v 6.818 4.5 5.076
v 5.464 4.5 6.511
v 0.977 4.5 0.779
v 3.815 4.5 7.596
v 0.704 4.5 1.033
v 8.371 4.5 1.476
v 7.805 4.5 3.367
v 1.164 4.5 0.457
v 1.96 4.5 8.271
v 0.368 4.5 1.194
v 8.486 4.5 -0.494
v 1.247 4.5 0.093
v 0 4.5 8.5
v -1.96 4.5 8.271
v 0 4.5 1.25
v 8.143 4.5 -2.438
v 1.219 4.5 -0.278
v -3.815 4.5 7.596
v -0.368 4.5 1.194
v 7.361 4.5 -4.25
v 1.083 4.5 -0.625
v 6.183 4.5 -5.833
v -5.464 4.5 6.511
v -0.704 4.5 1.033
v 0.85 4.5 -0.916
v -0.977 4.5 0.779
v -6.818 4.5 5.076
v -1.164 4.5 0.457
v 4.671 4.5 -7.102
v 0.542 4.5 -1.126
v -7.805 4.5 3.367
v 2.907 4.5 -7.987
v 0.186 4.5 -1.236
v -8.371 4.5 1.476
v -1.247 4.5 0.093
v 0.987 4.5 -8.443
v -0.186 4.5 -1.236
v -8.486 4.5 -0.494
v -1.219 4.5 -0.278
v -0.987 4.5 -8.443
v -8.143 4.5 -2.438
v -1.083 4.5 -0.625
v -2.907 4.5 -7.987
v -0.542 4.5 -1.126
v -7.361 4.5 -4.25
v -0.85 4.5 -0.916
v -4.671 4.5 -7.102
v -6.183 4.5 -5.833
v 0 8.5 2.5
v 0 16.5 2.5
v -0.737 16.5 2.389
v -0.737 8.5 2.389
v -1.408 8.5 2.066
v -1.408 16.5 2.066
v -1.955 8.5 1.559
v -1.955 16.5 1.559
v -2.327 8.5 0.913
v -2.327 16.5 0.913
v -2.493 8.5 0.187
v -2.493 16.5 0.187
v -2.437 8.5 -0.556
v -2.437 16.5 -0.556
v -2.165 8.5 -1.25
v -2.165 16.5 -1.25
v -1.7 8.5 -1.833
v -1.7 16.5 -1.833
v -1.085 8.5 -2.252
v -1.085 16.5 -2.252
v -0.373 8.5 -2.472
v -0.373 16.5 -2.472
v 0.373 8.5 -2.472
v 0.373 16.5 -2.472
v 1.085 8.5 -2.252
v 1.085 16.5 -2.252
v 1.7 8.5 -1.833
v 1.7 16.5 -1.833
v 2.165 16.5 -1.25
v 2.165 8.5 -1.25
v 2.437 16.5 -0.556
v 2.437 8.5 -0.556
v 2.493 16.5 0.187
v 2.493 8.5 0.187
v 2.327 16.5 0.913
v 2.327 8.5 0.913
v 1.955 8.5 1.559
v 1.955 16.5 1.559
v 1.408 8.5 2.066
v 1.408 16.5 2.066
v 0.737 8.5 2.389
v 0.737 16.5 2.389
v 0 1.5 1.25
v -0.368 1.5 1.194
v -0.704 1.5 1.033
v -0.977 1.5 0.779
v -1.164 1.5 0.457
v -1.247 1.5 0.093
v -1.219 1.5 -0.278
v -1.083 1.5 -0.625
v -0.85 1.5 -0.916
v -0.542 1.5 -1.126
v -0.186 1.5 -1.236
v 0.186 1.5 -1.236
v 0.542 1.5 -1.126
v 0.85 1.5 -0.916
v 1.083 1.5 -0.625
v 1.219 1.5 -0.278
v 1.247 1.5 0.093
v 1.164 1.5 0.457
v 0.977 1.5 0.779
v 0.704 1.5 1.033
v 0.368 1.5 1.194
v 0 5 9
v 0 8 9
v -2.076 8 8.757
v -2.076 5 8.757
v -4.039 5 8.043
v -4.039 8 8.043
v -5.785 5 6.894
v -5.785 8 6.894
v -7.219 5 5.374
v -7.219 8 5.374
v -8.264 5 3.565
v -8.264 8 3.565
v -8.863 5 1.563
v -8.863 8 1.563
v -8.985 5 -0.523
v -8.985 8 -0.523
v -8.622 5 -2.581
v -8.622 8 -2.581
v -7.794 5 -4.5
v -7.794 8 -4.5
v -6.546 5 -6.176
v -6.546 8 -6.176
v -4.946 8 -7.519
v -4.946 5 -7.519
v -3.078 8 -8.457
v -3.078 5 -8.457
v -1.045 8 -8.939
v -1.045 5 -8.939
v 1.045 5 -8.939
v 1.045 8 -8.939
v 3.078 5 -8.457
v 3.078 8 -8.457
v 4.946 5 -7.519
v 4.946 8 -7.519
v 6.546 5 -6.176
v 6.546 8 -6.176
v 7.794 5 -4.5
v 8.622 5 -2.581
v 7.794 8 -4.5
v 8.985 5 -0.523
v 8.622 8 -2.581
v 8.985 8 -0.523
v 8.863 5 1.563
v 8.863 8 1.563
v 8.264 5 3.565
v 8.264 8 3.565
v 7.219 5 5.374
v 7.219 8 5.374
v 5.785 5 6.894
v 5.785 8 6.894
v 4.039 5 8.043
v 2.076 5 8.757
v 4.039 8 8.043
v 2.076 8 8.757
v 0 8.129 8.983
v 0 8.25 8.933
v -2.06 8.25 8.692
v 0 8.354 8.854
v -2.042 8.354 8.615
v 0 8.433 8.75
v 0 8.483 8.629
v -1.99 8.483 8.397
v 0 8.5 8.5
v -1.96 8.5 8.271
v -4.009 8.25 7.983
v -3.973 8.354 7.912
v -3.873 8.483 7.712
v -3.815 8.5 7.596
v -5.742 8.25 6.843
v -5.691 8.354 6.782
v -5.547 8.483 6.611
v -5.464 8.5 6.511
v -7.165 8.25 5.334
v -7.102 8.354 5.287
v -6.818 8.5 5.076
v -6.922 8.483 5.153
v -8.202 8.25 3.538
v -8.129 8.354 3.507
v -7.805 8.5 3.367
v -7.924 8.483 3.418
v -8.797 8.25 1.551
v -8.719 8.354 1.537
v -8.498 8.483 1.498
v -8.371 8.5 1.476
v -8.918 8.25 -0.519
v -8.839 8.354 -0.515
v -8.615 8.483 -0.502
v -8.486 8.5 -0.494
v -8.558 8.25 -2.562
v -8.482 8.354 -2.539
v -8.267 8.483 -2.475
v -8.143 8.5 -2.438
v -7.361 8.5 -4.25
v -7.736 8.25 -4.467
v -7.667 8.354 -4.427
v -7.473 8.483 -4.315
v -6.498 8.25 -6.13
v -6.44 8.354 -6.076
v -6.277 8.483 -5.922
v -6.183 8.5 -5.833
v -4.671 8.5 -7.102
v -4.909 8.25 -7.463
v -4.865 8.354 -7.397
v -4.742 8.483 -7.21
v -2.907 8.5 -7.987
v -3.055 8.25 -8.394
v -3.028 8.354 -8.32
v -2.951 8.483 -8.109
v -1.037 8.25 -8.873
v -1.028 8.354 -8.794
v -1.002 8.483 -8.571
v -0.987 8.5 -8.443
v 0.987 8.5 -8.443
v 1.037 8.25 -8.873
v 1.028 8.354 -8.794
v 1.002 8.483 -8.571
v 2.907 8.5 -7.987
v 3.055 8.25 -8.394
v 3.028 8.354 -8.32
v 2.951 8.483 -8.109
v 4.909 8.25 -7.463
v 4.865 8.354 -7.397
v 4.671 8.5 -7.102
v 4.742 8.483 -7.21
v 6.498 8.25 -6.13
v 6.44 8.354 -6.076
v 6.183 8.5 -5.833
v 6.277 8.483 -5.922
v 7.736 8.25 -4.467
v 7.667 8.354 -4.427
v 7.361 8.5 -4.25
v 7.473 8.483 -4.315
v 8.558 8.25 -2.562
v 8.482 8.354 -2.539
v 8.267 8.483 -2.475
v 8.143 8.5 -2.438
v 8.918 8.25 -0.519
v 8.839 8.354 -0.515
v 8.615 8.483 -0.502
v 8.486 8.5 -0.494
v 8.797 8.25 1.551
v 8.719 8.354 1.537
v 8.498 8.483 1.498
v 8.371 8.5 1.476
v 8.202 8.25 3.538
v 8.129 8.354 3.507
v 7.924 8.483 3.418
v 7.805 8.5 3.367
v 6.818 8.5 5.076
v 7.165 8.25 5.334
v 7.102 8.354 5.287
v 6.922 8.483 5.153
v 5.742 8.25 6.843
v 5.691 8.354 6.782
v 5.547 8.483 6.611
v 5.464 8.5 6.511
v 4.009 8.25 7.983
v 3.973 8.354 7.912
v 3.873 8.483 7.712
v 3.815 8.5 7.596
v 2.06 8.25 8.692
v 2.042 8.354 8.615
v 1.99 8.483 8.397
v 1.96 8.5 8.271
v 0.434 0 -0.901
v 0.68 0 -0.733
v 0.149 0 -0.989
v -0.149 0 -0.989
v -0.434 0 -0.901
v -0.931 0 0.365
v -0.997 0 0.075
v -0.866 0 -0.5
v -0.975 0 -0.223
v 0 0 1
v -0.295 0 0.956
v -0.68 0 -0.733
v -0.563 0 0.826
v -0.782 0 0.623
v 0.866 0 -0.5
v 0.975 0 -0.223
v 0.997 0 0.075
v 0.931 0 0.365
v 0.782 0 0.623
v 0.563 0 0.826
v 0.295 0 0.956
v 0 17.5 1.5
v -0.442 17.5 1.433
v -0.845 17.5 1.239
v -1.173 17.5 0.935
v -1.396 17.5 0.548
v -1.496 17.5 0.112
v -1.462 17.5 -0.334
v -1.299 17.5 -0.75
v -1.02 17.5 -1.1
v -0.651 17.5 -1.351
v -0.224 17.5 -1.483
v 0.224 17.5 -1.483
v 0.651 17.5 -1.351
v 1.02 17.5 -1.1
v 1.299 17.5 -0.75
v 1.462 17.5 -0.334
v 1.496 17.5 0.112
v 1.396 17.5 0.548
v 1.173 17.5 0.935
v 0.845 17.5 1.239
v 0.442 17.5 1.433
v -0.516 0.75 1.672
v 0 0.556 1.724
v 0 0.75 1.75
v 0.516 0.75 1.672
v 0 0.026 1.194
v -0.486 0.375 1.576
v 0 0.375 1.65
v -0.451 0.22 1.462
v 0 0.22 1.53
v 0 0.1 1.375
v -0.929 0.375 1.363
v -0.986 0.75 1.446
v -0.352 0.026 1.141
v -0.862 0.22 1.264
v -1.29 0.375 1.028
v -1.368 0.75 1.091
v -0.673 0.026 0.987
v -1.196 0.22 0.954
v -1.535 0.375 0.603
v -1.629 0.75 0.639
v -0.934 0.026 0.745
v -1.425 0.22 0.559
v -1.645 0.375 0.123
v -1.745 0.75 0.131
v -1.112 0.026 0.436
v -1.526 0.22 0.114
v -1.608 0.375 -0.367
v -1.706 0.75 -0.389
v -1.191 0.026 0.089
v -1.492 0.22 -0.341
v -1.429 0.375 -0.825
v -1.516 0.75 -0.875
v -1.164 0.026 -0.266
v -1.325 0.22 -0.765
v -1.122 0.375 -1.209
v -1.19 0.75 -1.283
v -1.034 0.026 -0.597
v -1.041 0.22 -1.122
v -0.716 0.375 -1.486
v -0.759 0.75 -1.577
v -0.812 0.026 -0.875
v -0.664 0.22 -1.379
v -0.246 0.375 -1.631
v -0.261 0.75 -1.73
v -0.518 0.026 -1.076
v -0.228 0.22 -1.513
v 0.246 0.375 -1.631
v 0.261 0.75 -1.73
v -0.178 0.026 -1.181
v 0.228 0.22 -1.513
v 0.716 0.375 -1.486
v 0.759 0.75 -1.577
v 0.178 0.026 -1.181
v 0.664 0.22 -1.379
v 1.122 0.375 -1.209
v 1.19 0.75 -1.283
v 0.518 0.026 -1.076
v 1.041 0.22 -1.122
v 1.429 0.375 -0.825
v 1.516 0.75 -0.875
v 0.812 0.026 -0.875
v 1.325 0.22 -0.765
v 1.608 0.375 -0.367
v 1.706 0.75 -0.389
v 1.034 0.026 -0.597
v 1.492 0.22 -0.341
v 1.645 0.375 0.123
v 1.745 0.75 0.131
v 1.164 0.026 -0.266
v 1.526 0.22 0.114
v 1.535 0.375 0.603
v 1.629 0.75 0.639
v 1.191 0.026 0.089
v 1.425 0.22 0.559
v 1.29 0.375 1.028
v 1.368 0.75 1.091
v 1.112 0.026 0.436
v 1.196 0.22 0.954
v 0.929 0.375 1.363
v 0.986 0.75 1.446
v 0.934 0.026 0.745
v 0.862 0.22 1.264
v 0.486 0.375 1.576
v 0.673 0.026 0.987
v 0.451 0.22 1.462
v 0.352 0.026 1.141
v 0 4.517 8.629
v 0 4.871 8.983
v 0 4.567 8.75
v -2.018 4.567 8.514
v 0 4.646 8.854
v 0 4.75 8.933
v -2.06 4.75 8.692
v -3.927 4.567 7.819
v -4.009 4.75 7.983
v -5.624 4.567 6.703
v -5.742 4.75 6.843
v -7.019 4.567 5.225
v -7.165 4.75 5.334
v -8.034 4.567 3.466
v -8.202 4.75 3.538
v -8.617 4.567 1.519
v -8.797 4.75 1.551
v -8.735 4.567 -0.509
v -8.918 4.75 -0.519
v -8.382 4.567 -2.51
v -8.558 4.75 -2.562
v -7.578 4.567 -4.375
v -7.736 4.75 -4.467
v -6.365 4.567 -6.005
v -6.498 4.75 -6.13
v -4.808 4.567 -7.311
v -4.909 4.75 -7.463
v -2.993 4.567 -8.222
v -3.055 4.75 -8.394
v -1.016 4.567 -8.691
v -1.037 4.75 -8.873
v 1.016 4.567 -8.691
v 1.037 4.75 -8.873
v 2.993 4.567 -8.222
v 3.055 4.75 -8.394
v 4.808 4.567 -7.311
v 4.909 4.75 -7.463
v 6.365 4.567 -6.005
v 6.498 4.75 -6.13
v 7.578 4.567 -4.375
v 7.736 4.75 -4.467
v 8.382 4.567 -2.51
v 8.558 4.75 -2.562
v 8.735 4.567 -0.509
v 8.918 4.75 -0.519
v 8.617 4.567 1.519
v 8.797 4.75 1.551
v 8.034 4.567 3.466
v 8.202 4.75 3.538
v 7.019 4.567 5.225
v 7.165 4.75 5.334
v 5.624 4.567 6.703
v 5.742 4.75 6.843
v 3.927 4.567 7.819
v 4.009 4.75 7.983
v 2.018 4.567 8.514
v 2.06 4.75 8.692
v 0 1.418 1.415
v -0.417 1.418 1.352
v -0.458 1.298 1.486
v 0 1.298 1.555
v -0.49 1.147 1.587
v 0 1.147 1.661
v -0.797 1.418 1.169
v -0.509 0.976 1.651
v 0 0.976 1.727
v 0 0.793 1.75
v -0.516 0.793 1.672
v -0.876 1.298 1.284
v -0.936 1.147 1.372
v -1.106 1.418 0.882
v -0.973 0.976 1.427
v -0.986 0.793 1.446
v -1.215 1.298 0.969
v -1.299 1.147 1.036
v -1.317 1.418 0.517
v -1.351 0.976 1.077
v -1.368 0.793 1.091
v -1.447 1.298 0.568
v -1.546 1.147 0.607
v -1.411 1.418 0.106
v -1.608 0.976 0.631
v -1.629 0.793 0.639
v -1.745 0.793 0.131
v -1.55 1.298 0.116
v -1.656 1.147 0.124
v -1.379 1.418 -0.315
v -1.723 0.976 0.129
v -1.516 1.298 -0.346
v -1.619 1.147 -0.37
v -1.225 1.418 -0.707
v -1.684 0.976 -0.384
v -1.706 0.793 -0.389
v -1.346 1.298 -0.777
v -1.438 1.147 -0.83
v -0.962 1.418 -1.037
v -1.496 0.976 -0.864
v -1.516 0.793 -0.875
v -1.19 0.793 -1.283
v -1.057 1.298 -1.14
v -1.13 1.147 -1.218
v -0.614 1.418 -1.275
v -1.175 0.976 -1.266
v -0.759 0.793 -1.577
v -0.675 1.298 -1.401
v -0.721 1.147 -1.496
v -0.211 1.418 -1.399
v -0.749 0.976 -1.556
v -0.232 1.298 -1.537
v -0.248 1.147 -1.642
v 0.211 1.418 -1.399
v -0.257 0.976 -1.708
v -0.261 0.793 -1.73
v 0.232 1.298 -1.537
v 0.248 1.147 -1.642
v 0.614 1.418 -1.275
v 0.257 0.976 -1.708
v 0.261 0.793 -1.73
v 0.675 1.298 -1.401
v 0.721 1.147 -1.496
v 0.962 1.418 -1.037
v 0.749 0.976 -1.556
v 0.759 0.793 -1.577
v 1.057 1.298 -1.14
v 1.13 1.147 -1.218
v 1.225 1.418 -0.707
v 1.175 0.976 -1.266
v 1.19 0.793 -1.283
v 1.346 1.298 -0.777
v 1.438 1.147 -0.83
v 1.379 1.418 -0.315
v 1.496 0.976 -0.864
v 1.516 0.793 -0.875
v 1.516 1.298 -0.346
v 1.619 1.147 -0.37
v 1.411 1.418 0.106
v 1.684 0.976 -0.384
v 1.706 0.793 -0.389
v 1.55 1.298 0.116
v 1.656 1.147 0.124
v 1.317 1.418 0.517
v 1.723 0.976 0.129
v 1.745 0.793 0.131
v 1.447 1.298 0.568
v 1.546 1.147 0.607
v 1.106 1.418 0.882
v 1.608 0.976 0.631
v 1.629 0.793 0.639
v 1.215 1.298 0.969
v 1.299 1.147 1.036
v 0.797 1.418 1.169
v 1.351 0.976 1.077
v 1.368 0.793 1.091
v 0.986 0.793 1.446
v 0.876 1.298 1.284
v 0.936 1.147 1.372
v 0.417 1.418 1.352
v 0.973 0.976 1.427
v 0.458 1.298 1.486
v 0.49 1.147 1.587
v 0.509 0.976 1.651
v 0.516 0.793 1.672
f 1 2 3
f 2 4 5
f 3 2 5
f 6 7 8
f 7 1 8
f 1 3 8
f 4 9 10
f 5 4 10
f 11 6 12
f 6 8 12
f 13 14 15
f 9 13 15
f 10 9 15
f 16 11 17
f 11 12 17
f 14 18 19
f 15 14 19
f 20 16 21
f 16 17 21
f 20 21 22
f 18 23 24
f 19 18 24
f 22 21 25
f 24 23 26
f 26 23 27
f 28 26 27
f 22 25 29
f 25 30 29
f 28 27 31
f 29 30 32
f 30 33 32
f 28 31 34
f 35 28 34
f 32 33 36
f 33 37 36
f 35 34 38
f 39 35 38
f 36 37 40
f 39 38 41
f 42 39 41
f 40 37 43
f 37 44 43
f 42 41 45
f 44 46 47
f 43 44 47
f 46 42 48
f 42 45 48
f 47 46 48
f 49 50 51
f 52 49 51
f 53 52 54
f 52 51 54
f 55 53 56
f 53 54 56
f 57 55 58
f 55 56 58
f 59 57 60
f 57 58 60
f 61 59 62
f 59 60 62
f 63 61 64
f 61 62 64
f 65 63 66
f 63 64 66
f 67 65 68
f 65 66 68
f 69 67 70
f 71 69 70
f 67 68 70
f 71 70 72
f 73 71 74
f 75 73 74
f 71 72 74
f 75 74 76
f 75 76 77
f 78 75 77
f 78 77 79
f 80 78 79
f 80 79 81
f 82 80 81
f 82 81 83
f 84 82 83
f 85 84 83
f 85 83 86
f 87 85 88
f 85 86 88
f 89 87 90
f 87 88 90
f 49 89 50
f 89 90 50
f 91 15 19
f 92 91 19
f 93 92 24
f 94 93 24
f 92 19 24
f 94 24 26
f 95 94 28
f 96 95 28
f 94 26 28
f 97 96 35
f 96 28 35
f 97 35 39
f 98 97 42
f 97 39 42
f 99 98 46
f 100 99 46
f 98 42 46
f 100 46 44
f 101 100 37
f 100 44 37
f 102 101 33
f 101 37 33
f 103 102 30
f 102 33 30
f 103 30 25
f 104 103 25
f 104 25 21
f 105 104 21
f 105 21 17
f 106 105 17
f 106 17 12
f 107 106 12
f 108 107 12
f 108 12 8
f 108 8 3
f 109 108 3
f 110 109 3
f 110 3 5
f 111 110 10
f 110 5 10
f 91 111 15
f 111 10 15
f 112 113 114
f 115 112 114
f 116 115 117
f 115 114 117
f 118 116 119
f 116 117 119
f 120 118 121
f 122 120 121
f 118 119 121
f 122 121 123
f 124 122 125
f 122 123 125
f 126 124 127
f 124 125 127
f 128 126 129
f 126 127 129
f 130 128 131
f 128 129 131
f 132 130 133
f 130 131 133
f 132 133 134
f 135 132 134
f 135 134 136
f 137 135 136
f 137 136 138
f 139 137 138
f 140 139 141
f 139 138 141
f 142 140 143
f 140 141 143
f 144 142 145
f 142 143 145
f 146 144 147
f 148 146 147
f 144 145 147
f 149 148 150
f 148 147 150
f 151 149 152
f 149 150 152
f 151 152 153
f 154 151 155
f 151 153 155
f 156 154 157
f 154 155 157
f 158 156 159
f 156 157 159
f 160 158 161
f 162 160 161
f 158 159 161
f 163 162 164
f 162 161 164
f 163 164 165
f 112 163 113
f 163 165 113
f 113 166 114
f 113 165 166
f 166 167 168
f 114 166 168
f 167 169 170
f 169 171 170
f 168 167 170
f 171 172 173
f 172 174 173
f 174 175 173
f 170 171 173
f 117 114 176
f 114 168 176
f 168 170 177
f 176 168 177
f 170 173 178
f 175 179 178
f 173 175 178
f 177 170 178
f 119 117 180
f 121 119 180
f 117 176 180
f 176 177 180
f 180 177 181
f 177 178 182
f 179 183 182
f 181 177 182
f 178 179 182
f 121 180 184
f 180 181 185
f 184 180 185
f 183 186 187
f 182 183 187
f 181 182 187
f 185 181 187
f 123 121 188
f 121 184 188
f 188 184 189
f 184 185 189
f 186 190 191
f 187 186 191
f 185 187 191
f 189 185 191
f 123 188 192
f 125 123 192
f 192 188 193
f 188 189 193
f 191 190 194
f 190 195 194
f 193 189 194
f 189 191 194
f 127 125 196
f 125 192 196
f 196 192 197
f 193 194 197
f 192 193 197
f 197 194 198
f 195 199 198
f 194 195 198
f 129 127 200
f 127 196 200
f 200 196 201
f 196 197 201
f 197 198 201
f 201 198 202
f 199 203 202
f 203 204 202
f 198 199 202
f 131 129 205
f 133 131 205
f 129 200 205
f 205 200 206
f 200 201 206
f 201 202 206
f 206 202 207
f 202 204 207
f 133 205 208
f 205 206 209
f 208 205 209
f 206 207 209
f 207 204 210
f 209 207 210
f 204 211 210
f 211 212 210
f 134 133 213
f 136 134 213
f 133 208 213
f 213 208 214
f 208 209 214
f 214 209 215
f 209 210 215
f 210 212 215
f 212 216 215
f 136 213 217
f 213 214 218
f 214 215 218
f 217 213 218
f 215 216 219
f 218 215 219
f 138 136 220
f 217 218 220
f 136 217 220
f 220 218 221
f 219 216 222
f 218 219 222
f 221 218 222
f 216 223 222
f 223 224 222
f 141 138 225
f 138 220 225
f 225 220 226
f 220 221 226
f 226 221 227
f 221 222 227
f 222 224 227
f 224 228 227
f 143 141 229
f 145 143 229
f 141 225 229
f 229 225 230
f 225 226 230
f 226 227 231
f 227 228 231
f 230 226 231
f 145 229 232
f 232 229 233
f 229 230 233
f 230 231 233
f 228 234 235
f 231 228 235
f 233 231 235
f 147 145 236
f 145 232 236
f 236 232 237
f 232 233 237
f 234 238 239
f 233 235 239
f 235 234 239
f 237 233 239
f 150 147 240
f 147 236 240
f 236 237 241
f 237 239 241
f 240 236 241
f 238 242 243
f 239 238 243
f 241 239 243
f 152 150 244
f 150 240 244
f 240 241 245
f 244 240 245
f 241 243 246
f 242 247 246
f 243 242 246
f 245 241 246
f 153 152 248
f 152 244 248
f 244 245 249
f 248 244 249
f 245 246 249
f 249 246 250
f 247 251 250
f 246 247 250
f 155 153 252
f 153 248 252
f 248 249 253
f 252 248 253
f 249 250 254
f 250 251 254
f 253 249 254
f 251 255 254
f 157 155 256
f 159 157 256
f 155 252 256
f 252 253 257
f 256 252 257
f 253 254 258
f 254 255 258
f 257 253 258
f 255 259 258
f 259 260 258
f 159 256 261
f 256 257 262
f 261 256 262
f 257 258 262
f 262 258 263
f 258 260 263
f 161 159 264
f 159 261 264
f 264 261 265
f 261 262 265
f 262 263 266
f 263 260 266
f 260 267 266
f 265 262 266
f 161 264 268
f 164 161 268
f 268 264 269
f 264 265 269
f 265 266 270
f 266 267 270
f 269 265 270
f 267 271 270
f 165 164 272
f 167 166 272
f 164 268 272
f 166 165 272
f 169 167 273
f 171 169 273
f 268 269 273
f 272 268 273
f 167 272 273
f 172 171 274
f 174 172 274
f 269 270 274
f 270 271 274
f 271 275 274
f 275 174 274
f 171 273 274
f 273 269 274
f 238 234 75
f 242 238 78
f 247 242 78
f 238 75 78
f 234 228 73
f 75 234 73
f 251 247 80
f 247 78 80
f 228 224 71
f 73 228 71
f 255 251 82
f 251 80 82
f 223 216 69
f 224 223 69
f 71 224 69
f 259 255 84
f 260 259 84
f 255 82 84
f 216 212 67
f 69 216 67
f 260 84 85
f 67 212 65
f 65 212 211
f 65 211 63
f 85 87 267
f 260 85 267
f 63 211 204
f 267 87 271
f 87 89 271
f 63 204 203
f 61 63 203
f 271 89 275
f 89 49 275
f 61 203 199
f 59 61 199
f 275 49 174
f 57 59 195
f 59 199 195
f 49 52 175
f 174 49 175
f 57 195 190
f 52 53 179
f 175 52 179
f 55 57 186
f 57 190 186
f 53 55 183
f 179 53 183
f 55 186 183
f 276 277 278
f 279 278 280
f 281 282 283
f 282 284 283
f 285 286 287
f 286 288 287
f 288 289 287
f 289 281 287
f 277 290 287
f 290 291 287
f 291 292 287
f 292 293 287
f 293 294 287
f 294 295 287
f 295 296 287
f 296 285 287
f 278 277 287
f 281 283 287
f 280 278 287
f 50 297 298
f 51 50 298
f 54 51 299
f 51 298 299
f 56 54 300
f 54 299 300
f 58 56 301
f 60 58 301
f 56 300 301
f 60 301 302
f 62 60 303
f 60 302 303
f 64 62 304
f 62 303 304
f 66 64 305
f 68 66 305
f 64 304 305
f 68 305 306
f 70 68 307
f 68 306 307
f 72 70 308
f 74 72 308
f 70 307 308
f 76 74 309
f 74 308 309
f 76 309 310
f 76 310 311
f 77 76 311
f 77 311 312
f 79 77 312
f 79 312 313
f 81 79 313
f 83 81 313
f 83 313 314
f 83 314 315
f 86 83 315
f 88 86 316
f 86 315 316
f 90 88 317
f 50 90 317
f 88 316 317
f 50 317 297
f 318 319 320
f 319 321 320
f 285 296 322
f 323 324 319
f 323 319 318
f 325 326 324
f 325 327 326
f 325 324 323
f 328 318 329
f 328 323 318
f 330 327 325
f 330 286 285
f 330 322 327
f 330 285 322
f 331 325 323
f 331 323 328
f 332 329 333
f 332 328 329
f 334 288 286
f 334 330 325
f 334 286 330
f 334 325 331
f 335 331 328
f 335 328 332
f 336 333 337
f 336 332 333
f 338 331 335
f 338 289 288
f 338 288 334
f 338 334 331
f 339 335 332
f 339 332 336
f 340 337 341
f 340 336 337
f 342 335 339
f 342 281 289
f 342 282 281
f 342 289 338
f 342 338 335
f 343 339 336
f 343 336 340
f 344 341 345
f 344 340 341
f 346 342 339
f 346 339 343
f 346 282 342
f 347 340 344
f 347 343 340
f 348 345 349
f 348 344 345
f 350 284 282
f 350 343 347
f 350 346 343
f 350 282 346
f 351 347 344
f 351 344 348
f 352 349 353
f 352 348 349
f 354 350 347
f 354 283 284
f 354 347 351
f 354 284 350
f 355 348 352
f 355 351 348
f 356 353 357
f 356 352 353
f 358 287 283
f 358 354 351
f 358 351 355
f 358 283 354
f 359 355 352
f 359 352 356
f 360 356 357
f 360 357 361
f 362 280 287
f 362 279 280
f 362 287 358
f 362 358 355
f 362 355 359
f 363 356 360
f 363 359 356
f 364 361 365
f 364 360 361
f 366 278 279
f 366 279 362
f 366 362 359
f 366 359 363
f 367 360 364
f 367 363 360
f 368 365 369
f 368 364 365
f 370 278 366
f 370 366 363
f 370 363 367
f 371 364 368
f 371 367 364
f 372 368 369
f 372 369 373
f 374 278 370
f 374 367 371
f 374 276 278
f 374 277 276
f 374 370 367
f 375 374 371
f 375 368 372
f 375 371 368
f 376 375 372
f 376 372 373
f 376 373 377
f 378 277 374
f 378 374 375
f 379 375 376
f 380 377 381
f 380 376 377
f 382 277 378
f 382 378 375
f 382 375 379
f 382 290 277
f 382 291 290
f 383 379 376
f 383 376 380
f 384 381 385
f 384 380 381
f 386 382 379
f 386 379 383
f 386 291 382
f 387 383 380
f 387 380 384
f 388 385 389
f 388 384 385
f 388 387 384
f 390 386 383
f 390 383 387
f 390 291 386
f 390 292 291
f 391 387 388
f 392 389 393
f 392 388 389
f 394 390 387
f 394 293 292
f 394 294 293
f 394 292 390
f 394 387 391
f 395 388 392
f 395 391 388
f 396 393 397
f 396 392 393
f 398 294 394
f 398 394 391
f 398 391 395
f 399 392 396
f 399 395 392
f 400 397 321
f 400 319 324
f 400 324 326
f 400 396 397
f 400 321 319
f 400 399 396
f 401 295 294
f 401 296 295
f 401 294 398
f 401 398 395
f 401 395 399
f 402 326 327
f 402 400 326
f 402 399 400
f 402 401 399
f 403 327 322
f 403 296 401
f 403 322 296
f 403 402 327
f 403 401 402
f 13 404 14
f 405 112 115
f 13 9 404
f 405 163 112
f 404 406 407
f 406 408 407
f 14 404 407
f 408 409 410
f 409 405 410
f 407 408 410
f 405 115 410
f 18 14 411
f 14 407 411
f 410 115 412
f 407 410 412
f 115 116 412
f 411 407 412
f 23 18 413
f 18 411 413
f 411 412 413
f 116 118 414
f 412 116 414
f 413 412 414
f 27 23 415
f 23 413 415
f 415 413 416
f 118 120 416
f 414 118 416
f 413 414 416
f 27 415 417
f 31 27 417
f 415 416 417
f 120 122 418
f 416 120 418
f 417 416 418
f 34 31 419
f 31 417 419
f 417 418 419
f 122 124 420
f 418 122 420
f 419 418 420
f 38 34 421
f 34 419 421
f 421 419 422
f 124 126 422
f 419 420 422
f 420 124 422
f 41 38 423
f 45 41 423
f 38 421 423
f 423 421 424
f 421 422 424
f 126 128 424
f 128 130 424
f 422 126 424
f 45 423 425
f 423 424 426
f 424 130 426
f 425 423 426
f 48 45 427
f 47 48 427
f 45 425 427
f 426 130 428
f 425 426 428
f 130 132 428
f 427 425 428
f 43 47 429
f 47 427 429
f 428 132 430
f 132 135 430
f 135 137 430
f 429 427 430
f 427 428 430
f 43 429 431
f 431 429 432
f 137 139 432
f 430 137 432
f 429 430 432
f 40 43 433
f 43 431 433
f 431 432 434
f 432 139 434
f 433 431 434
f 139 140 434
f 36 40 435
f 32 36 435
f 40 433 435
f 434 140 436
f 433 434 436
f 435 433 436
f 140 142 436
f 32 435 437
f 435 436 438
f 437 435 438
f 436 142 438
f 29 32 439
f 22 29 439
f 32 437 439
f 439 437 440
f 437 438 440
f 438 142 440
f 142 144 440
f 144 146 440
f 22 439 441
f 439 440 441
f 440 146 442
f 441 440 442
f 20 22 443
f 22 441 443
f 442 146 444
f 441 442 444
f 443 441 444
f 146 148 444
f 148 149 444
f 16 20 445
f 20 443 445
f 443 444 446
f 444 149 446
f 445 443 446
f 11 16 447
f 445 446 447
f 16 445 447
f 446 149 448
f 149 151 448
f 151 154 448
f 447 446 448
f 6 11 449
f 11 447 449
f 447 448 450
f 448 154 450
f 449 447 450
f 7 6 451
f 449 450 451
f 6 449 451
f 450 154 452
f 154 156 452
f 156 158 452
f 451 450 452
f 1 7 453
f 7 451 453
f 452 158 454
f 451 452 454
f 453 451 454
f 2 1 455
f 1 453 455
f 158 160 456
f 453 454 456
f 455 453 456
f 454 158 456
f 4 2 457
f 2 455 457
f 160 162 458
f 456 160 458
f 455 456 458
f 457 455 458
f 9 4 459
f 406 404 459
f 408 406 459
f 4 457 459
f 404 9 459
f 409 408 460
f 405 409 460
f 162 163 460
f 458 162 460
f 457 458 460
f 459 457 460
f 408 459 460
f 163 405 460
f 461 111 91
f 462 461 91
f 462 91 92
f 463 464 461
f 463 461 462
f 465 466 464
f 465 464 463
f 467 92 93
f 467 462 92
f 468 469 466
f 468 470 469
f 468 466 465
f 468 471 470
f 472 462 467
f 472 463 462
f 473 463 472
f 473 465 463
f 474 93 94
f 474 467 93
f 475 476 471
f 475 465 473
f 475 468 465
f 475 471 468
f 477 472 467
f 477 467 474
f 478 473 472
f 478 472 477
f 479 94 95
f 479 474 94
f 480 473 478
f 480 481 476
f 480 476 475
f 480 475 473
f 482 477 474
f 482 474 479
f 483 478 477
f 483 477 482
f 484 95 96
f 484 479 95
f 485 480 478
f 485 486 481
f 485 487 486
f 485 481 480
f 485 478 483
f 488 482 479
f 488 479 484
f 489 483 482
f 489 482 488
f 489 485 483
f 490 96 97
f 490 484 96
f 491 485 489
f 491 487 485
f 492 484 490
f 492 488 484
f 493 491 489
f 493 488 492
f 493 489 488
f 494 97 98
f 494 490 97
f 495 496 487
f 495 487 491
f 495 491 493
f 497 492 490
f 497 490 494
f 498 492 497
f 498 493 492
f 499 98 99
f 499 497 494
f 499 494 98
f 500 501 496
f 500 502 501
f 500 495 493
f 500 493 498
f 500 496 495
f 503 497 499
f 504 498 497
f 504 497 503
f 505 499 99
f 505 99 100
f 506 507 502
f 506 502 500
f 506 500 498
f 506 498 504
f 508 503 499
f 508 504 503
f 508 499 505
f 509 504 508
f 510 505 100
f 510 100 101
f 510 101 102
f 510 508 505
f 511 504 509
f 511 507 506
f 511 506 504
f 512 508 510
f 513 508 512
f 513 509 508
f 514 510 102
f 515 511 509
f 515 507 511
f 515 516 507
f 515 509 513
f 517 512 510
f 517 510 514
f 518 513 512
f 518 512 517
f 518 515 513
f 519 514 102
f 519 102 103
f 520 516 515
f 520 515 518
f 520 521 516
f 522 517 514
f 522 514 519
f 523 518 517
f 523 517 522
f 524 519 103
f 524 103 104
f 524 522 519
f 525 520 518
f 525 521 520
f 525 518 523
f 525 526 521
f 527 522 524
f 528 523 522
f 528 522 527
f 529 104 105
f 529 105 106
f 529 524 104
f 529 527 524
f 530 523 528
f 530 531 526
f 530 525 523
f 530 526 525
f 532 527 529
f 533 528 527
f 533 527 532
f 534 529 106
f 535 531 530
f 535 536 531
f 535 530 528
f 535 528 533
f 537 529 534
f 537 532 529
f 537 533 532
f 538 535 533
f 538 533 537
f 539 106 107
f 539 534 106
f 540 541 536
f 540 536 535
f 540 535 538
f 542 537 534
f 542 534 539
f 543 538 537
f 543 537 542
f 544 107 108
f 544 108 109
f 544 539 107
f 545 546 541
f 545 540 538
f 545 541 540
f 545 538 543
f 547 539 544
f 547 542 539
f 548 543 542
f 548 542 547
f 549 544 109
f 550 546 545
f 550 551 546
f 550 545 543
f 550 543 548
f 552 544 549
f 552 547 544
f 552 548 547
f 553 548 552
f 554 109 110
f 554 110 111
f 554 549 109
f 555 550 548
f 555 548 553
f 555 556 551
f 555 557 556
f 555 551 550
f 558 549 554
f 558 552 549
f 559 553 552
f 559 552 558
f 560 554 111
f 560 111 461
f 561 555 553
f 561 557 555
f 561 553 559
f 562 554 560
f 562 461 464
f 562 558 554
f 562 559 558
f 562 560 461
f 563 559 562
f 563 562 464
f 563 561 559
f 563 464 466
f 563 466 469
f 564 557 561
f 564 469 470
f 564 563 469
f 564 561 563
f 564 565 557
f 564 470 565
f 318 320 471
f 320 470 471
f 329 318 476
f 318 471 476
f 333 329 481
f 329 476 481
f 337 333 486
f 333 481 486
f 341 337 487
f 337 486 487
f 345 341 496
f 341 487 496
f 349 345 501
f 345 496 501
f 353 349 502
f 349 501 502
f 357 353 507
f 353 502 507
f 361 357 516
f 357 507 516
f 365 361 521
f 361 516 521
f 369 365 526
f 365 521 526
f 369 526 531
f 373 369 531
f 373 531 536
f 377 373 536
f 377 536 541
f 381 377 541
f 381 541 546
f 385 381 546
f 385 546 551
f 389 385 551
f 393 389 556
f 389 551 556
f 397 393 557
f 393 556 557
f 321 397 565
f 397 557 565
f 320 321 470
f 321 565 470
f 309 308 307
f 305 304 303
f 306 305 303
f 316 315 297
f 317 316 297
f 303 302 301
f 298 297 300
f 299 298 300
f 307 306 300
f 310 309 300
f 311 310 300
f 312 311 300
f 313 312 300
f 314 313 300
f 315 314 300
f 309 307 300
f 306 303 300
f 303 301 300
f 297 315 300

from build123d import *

# Parameters (mm, degrees)
FILLET4_R     = 0.5
CHAMFER1_SIZE = 1
FILLET6_R     = 0.75


with BuildPart() as part:
    # Sketch1 → Revolve1 (revolve)
    with BuildSketch(Plane.XY, mode=Mode.PRIVATE) as revolve1_sk:
        Polygon((0, 0), (1.75, 0), (1.75, 1.5), (1.25, 1.5), (1.25, 4.5), (9, 4.5), (9, 8.5), (2.5, 8.5), (2.5, 17.5), (0, 17.5), align=None)
    revolve(revolve1_sk.sketch.rotate(Axis((0, 8.13, 0), (0, -1, 0)), 90), axis=Axis((0, 8.13, 0), (0, -1, 0)))

    # Fillet4
    fillet4_edges = [part.edges().sort_by_distance(p)[0] for p in [
        (0, 8.5, -9),
        (0, 4.5, -9),
    ]]
    fillet(fillet4_edges, radius=FILLET4_R)

    # Chamfer1
    chamfer1_edges = [part.edges().sort_by_distance(p)[0] for p in [
        (0, 17.5, -2.5),
    ]]
    chamfer(chamfer1_edges, length=CHAMFER1_SIZE)

    # Fillet6
    # the kernel refuses this fillet: 0.75 mm, written as the material it takes off along each edge
    with BuildSketch(Plane(origin=(0, 1.5, 0), x_dir=(0, 0, 1), z_dir=(1, 0, 0))) as fillet6_piece_1:
        with BuildLine():
            CenterArc((1, 0.707106781), FILLET6_R, 289.471220634, 70.528779366)
            Line((1.75, 0.707106781), (1.765, 0.707106781))
            Line((1.765, 0.707106781), (1.765, 0))
            Line((1.765, 0), (1.75, -0.015))
            ThreePointArc((1.75, -0.015), (1.5, -0.015), (1.255, -0.014142136))
            Line((1.255, -0.014142136), (1.25, 0))
        make_face()
    revolve(axis=Axis((0, 1.5, 0), (0, -1, 0)), mode=Mode.SUBTRACT)
    with BuildSketch(Plane(origin=(0, 0, 0), x_dir=(0, 0, 1), z_dir=(1, 0, 0))) as fillet6_piece_2:
        with BuildLine():
            CenterArc((1.75 - FILLET6_R, -FILLET6_R), FILLET6_R, 0, 90)
            Line((1.75 - FILLET6_R, 0), (1.75 - FILLET6_R, FILLET6_R * 0.02))
            Line((1.75 - FILLET6_R, FILLET6_R * 0.02), (1.75 + FILLET6_R * 0.02, FILLET6_R * 0.02))
            Line((1.75 + FILLET6_R * 0.02, FILLET6_R * 0.02), (1.75 + FILLET6_R * 0.02, -FILLET6_R))
            Line((1.75 + FILLET6_R * 0.02, -FILLET6_R), (1.75, -FILLET6_R))
        make_face()
    revolve(axis=Axis((0, 0, 0), (0, -1, 0)), mode=Mode.SUBTRACT)


solid = part.part
